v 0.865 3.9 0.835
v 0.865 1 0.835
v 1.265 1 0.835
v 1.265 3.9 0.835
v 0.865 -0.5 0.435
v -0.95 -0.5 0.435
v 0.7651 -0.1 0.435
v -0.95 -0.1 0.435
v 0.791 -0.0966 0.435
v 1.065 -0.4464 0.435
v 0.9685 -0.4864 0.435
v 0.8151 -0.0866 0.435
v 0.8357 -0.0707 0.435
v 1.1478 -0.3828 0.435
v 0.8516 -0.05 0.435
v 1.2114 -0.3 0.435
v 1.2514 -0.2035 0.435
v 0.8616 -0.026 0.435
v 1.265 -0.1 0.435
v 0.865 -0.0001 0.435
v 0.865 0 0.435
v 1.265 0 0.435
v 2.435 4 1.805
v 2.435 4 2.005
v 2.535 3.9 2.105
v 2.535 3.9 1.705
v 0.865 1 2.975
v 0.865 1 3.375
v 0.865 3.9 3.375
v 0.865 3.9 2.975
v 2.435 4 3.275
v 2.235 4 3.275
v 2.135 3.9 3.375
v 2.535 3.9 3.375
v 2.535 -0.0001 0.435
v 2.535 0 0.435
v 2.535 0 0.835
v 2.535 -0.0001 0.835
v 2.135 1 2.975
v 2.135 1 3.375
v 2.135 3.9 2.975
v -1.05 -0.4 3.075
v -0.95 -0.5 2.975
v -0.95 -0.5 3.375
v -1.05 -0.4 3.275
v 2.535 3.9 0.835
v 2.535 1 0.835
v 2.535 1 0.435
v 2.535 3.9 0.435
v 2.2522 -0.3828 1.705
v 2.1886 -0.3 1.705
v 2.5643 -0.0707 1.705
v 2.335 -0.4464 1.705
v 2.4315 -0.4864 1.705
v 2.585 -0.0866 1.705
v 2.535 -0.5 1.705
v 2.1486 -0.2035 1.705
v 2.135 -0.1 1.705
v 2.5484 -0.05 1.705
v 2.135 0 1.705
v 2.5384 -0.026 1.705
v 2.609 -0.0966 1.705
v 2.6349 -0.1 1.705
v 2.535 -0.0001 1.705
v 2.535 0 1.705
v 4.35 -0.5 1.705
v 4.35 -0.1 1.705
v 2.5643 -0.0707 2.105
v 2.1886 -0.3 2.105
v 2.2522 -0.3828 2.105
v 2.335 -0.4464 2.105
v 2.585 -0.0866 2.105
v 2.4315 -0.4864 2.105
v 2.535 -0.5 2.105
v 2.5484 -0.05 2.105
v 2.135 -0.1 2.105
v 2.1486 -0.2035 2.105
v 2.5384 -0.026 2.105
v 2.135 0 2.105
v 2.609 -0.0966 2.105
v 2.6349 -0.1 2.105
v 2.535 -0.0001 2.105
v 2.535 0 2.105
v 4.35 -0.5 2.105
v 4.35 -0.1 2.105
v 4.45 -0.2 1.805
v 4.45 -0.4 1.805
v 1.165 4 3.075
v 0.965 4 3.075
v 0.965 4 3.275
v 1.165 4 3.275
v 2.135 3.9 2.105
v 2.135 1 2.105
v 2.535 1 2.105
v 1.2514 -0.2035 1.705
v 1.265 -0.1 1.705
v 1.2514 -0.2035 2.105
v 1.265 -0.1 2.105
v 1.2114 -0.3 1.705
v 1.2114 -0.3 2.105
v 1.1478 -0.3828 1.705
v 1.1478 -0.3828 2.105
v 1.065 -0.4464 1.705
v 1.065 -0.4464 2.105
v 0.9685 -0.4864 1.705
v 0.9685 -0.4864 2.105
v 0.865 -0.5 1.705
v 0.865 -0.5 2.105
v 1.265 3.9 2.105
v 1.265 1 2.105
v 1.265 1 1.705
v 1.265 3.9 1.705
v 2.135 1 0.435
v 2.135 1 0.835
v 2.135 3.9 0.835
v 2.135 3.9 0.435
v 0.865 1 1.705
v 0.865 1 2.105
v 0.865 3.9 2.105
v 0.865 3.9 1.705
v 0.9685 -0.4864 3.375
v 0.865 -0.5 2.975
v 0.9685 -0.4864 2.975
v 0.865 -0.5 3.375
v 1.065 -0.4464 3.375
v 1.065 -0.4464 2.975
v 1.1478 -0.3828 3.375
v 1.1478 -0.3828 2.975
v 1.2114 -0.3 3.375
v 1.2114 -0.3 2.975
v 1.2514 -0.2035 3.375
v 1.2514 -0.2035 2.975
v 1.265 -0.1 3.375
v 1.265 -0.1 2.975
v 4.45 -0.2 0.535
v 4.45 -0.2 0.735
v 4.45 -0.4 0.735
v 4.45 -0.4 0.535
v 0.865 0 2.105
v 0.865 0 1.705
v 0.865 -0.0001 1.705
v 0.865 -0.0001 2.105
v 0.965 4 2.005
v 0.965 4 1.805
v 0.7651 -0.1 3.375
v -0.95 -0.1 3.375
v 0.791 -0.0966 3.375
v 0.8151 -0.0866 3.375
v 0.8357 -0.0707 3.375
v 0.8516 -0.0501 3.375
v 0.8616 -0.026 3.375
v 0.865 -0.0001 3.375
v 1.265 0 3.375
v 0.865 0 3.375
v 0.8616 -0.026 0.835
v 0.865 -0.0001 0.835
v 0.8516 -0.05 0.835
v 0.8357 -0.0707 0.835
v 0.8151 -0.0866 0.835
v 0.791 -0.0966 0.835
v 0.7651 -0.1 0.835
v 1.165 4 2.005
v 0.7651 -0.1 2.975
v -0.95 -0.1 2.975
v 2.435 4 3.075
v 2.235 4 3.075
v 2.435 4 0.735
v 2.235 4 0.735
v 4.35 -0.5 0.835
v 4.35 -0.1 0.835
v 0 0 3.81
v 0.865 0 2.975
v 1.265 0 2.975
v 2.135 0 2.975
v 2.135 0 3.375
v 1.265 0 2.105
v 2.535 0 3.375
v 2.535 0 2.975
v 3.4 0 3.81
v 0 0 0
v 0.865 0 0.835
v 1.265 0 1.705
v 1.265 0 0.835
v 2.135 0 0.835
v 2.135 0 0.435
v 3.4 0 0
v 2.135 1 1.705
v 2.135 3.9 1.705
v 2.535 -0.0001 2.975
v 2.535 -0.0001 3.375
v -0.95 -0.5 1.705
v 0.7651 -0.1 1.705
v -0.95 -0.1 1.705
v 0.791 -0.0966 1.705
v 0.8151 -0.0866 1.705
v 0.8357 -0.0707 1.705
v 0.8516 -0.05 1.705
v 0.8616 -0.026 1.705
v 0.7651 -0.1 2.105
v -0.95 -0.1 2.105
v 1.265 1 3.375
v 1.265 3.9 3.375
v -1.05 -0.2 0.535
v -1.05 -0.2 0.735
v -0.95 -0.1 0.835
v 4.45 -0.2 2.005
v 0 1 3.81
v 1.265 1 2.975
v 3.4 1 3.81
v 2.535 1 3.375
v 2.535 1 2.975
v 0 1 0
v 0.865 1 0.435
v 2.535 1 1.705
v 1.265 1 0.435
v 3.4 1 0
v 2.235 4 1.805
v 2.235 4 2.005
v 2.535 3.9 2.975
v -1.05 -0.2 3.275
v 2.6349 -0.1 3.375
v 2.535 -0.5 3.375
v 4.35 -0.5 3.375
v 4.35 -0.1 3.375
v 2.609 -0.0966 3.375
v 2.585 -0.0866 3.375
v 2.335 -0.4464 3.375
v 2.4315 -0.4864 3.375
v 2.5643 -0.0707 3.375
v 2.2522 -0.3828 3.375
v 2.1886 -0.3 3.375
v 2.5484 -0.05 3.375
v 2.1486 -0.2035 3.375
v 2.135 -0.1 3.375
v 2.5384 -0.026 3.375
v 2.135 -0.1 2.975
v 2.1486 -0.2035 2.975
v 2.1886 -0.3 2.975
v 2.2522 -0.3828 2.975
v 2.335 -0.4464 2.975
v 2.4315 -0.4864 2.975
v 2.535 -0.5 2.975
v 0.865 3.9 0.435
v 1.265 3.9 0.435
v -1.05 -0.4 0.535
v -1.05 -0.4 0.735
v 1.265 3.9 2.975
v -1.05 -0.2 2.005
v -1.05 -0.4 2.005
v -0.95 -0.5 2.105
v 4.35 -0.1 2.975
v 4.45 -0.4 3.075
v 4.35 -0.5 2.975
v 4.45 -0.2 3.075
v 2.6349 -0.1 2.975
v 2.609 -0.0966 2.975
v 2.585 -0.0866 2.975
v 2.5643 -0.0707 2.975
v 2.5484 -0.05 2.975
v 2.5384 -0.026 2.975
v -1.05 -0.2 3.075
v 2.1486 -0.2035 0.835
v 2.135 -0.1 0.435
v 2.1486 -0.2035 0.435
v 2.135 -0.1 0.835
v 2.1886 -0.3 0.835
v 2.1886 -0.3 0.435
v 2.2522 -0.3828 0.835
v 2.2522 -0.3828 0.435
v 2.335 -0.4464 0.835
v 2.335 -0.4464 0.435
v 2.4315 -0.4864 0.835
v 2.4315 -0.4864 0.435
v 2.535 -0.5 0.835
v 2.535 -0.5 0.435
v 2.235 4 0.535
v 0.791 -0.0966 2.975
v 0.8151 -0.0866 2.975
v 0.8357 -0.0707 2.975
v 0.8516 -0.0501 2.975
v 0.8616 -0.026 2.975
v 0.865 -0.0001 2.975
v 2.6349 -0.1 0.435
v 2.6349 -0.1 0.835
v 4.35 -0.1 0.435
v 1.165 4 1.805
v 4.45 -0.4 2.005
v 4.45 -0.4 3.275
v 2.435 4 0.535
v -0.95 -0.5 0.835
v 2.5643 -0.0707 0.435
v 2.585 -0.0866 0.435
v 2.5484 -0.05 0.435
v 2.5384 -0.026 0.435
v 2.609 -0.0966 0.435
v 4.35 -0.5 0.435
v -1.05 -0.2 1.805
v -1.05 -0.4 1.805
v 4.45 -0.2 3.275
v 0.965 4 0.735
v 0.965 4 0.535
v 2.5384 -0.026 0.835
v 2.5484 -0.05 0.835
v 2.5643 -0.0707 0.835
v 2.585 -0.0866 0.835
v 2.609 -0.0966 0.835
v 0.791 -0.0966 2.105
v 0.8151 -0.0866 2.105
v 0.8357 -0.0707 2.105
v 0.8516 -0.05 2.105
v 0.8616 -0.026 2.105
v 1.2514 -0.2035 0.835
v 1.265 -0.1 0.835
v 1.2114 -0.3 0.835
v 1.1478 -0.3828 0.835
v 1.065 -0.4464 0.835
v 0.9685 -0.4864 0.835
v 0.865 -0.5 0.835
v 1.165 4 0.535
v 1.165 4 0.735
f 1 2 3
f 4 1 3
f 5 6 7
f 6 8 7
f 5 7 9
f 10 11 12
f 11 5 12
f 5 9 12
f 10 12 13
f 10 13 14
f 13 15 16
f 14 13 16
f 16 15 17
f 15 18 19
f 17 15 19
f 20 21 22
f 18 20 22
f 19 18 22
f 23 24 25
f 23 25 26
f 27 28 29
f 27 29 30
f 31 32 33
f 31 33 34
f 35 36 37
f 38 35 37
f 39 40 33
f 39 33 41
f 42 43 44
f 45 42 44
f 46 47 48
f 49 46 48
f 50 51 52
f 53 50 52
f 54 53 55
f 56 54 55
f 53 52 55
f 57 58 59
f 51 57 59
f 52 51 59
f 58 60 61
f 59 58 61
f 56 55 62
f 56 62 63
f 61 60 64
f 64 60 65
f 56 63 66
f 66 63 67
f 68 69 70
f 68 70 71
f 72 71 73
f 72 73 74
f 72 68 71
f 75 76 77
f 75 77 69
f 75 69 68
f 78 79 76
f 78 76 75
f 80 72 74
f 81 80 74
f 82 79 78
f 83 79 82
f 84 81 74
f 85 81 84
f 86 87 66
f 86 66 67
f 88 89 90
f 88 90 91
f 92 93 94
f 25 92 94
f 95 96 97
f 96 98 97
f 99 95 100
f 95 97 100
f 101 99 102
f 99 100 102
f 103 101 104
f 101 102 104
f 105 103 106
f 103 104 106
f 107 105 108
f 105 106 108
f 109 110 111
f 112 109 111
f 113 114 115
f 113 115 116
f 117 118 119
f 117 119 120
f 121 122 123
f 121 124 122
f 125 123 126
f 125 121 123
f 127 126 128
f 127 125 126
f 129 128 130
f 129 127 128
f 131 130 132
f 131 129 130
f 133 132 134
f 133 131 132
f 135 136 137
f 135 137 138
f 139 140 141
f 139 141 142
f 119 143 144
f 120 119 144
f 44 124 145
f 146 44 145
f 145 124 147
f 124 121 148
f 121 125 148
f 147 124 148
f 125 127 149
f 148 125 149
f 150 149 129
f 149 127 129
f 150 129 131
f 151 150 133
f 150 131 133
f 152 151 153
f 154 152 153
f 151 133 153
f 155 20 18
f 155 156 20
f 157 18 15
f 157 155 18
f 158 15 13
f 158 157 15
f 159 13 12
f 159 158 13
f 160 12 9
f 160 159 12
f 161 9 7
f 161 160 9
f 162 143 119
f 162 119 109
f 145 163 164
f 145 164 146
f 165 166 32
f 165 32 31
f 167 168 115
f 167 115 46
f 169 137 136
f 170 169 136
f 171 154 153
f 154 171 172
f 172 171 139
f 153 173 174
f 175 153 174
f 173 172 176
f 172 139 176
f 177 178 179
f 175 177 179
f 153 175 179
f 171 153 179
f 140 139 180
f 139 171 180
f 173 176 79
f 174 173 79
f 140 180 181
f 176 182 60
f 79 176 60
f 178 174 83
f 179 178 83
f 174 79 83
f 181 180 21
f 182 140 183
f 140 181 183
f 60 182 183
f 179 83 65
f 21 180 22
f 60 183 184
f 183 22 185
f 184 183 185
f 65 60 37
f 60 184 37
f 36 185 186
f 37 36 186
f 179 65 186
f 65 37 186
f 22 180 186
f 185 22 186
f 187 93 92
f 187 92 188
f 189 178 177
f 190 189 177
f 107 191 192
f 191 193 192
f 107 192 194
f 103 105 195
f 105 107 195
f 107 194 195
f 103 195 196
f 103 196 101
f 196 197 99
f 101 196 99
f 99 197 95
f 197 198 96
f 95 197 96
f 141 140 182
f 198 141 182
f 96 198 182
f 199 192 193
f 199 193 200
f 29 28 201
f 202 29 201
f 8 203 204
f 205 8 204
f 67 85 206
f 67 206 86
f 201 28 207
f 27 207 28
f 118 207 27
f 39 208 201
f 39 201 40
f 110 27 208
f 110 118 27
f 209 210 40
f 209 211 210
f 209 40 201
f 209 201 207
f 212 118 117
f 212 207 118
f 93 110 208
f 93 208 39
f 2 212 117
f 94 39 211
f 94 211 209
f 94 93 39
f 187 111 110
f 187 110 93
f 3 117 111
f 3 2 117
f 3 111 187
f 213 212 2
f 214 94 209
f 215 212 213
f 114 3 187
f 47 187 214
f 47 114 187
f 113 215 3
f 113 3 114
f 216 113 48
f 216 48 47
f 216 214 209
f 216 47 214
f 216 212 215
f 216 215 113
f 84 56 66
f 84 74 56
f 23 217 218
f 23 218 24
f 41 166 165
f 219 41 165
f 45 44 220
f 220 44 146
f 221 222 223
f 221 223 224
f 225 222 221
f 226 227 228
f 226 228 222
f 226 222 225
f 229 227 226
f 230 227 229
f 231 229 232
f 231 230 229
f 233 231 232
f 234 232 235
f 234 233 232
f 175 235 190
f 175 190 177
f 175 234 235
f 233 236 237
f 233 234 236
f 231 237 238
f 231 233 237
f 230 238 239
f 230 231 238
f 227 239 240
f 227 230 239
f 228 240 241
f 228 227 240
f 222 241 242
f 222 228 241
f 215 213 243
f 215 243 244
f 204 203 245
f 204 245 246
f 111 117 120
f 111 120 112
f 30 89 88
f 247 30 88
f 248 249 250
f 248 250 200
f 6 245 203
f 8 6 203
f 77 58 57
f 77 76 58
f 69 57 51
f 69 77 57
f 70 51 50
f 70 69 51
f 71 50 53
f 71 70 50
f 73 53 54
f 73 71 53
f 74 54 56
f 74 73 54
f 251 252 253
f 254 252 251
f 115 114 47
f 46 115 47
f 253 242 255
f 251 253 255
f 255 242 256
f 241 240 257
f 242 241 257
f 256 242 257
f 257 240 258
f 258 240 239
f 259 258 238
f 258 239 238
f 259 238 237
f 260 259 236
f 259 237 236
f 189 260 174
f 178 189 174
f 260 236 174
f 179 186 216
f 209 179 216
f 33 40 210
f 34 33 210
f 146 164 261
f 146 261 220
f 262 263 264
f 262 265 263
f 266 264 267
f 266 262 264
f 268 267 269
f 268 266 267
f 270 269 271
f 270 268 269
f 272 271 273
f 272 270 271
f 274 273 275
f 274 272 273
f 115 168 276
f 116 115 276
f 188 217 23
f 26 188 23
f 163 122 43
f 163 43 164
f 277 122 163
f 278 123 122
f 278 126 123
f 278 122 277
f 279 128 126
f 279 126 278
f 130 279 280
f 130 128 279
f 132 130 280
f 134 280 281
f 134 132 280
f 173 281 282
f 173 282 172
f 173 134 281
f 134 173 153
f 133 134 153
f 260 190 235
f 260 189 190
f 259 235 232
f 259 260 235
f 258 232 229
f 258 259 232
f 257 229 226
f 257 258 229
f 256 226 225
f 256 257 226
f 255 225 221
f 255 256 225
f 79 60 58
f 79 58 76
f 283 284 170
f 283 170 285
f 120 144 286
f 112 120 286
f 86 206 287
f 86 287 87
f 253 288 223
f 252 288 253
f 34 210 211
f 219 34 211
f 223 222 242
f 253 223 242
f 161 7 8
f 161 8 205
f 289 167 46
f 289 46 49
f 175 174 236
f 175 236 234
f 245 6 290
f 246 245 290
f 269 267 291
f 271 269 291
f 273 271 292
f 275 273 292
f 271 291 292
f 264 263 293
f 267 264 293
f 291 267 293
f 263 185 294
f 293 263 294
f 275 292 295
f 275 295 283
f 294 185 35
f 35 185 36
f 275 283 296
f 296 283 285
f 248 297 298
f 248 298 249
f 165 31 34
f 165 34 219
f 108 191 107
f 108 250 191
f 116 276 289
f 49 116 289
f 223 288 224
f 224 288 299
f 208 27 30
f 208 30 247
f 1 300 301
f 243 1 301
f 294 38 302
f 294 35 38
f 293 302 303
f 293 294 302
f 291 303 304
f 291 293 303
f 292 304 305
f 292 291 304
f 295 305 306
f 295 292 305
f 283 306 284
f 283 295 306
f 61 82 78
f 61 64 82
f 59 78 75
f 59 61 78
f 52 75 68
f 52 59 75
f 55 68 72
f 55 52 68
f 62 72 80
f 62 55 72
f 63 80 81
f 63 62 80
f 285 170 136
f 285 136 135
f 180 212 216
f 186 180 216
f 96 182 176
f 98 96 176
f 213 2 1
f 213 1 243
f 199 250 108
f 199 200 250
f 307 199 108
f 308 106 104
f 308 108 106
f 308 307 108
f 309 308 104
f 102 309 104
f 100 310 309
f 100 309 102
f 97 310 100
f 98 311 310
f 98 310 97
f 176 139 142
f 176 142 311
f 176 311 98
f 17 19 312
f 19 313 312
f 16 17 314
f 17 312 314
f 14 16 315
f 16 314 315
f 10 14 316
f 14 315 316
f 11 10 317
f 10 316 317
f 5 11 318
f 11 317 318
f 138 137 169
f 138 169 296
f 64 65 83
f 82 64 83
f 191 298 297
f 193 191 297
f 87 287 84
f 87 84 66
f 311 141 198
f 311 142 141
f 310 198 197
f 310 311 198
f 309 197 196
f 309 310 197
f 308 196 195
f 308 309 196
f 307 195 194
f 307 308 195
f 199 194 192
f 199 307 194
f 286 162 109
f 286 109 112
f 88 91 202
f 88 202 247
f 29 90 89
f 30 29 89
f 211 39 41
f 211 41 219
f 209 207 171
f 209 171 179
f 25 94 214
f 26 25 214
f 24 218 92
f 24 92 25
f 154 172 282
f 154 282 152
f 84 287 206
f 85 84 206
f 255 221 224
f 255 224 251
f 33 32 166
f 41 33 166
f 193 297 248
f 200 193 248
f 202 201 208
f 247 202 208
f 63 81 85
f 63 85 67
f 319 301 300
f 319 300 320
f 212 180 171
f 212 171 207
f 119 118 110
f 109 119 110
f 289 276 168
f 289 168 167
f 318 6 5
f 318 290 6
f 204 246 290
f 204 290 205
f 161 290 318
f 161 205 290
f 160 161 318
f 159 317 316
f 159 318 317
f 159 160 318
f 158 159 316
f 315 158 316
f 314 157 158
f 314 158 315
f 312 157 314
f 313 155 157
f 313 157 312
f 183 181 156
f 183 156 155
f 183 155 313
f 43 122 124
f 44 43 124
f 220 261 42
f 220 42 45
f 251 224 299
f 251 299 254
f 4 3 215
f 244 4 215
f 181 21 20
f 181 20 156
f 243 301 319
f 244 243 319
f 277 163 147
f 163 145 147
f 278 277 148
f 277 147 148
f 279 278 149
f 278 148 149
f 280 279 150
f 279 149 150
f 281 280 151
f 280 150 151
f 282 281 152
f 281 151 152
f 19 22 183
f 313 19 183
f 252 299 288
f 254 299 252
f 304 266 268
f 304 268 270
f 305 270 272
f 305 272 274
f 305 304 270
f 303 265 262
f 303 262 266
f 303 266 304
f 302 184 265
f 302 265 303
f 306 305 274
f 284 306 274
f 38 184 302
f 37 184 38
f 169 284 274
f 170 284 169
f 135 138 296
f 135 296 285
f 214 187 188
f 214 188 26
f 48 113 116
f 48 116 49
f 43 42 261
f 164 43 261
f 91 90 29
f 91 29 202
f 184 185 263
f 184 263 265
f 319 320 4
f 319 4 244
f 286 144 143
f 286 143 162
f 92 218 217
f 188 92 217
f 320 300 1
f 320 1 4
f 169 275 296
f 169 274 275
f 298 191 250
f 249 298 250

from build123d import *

# Parameters (mm, degrees)
SKIZZE1_W                       = 3.4
SKIZZE1_H                       = 1
AUFSATZ_LINEAR_AUSTRAGEN1_DEPTH = 3.81
SKIZZE3_W                       = 0.4
SKIZZE3_H                       = 0.4
AUFSATZ_LINEAR_AUSTRAGEN3_DEPTH = 0.5
SKIZZE4_W                       = 0.4
SKIZZE4_H                       = 0.4
AUFSATZ_LINEAR_AUSTRAGEN4_DEPTH = 1.915
SKIZZE5_W                       = 0.4
SKIZZE5_H                       = 0.4
AUFSATZ_LINEAR_AUSTRAGEN5_DEPTH = 1.915
SKIZZE6_W                       = 0.4
SKIZZE6_H                       = 0.4
AUFSATZ_LINEAR_AUSTRAGEN6_DEPTH = 3
FASE2_SIZE                      = 0.1
VERRUNDUNG1_R                   = 0.1
VERRUNDUNG2_R                   = 0.4


with BuildPart() as part:
    # Skizze1 → Aufsatz-Linear austragen1 (new body)
    with BuildSketch(Plane.XY):
        with Locations((1.7, 0.5)):
            Rectangle(SKIZZE1_W, SKIZZE1_H)
    extrude(amount=AUFSATZ_LINEAR_AUSTRAGEN1_DEPTH)

    # Skizze3 → Aufsatz-Linear austragen3 (add)
    with BuildSketch(Plane.XZ):
        with Locations((1.065, 3.175)):
            Rectangle(SKIZZE3_W, SKIZZE3_H)
        with Locations((2.335, 3.175)):
            Rectangle(SKIZZE3_W, SKIZZE3_H)
        with Locations((1.065, 1.905)):
            Rectangle(SKIZZE3_W, SKIZZE3_H)
        with Locations((2.335, 1.905)):
            Rectangle(SKIZZE3_W, SKIZZE3_H)
        with Locations((1.065, 0.635)):
            Rectangle(SKIZZE3_W, SKIZZE3_H)
        with Locations((2.335, 0.635)):
            Rectangle(SKIZZE3_W, SKIZZE3_H)
    extrude(amount=AUFSATZ_LINEAR_AUSTRAGEN3_DEPTH)

    # Skizze4 → Aufsatz-Linear austragen4 (add)
    with BuildSketch(Plane(origin=(2.535, 0, 0), x_dir=(0, 0, -1), z_dir=(1, 0, 0))):
        with Locations((-3.175, -0.3)):
            Rectangle(SKIZZE4_W, SKIZZE4_H)
        with Locations((-1.905, -0.3)):
            Rectangle(SKIZZE4_W, SKIZZE4_H)
        with Locations((-0.635, -0.3)):
            Rectangle(SKIZZE4_W, SKIZZE4_H)
    extrude(amount=AUFSATZ_LINEAR_AUSTRAGEN4_DEPTH)

    # Skizze5 → Aufsatz-Linear austragen5 (add)
    with BuildSketch(Plane.ZY.offset(-0.865)):
        with Locations((3.175, -0.3)):
            Rectangle(SKIZZE5_W, SKIZZE5_H)
        with Locations((1.905, -0.3)):
            Rectangle(SKIZZE5_W, SKIZZE5_H)
        with Locations((0.635, -0.3)):
            Rectangle(SKIZZE5_W, SKIZZE5_H)
    extrude(amount=AUFSATZ_LINEAR_AUSTRAGEN5_DEPTH)

    # Skizze6 → Aufsatz-Linear austragen6 (add)
    with BuildSketch(Plane(origin=(0, 1, 0), x_dir=(1, 0, 0), z_dir=(0, 1, 0))):
        with Locations((1.065, -0.635)):
            Rectangle(SKIZZE6_W, SKIZZE6_H)
        with Locations((2.335, -0.635)):
            Rectangle(SKIZZE6_W, SKIZZE6_H)
        with Locations((1.065, -1.905)):
            Rectangle(SKIZZE6_W, SKIZZE6_H)
        with Locations((2.335, -1.905)):
            Rectangle(SKIZZE6_W, SKIZZE6_H)
        with Locations((1.065, -3.175)):
            Rectangle(SKIZZE6_W, SKIZZE6_H)
        with Locations((2.335, -3.175)):
            Rectangle(SKIZZE6_W, SKIZZE6_H)
    extrude(amount=AUFSATZ_LINEAR_AUSTRAGEN6_DEPTH)

    # Fase2
    fase2_edges = [part.edges().sort_by_distance(p)[0] for p in [
        (4.45, -0.3, 0.835),
        (4.45, -0.5, 0.635),
        (4.45, -0.3, 0.435),
        (4.45, -0.1, 0.635),
        (-1.05, -0.3, 3.375),
        (-1.05, -0.1, 3.175),
        (-1.05, -0.3, 2.975),
        (-1.05, -0.5, 3.175),
        (-1.05, -0.3, 2.105),
        (-1.05, -0.1, 1.905),
        (-1.05, -0.3, 1.705),
        (-1.05, -0.5, 1.905),
        (-1.05, -0.3, 0.835),
        (-1.05, -0.1, 0.635),
        (-1.05, -0.3, 0.435),
        (-1.05, -0.5, 0.635),
        (1.265, 4, 0.635),
        (1.065, 4, 0.435),
        (0.865, 4, 0.635),
        (1.065, 4, 0.835),
        (2.535, 4, 0.635),
        (2.335, 4, 0.435),
        (2.135, 4, 0.635),
        (2.335, 4, 0.835),
        (1.265, 4, 1.905),
        (1.065, 4, 1.705),
        (0.865, 4, 1.905),
        (1.065, 4, 2.105),
        (2.535, 4, 1.905),
        (2.335, 4, 1.705),
        (2.135, 4, 1.905),
        (2.335, 4, 2.105),
        (1.265, 4, 3.175),
        (1.065, 4, 2.975),
        (0.865, 4, 3.175),
        (1.065, 4, 3.375),
        (2.535, 4, 3.175),
        (2.335, 4, 2.975),
        (2.135, 4, 3.175),
        (2.335, 4, 3.375),
        (4.45, -0.3, 3.375),
        (4.45, -0.5, 3.175),
        (4.45, -0.3, 2.975),
        (4.45, -0.1, 3.175),
        (4.45, -0.3, 2.105),
        (4.45, -0.5, 1.905),
        (4.45, -0.3, 1.705),
        (4.45, -0.1, 1.905),
    ]]
    chamfer(fase2_edges, length=FASE2_SIZE)

    # Verrundung1
    verrundung1_edges = [part.edges().sort_by_distance(p)[0] for p in [
        (0.865, -0.1, 3.175),
        (0.865, -0.1, 1.905),
        (0.865, -0.1, 0.635),
        (2.535, -0.1, 3.175),
        (2.535, -0.1, 1.905),
        (2.535, -0.1, 0.635),
    ]]
    fillet(verrundung1_edges, radius=VERRUNDUNG1_R - 0.0001)  # a hair under: the kernel refuses the full size

    # Verrundung2
    verrundung2_edges = [part.edges().sort_by_distance(p)[0] for p in [
        (1.265, -0.5, 3.175),
        (2.135, -0.5, 3.175),
        (1.265, -0.5, 1.905),
        (2.135, -0.5, 1.905),
        (1.265, -0.5, 0.635),
        (2.135, -0.5, 0.635),
    ]]
    fillet(verrundung2_edges, radius=VERRUNDUNG2_R)


solid = part.part
